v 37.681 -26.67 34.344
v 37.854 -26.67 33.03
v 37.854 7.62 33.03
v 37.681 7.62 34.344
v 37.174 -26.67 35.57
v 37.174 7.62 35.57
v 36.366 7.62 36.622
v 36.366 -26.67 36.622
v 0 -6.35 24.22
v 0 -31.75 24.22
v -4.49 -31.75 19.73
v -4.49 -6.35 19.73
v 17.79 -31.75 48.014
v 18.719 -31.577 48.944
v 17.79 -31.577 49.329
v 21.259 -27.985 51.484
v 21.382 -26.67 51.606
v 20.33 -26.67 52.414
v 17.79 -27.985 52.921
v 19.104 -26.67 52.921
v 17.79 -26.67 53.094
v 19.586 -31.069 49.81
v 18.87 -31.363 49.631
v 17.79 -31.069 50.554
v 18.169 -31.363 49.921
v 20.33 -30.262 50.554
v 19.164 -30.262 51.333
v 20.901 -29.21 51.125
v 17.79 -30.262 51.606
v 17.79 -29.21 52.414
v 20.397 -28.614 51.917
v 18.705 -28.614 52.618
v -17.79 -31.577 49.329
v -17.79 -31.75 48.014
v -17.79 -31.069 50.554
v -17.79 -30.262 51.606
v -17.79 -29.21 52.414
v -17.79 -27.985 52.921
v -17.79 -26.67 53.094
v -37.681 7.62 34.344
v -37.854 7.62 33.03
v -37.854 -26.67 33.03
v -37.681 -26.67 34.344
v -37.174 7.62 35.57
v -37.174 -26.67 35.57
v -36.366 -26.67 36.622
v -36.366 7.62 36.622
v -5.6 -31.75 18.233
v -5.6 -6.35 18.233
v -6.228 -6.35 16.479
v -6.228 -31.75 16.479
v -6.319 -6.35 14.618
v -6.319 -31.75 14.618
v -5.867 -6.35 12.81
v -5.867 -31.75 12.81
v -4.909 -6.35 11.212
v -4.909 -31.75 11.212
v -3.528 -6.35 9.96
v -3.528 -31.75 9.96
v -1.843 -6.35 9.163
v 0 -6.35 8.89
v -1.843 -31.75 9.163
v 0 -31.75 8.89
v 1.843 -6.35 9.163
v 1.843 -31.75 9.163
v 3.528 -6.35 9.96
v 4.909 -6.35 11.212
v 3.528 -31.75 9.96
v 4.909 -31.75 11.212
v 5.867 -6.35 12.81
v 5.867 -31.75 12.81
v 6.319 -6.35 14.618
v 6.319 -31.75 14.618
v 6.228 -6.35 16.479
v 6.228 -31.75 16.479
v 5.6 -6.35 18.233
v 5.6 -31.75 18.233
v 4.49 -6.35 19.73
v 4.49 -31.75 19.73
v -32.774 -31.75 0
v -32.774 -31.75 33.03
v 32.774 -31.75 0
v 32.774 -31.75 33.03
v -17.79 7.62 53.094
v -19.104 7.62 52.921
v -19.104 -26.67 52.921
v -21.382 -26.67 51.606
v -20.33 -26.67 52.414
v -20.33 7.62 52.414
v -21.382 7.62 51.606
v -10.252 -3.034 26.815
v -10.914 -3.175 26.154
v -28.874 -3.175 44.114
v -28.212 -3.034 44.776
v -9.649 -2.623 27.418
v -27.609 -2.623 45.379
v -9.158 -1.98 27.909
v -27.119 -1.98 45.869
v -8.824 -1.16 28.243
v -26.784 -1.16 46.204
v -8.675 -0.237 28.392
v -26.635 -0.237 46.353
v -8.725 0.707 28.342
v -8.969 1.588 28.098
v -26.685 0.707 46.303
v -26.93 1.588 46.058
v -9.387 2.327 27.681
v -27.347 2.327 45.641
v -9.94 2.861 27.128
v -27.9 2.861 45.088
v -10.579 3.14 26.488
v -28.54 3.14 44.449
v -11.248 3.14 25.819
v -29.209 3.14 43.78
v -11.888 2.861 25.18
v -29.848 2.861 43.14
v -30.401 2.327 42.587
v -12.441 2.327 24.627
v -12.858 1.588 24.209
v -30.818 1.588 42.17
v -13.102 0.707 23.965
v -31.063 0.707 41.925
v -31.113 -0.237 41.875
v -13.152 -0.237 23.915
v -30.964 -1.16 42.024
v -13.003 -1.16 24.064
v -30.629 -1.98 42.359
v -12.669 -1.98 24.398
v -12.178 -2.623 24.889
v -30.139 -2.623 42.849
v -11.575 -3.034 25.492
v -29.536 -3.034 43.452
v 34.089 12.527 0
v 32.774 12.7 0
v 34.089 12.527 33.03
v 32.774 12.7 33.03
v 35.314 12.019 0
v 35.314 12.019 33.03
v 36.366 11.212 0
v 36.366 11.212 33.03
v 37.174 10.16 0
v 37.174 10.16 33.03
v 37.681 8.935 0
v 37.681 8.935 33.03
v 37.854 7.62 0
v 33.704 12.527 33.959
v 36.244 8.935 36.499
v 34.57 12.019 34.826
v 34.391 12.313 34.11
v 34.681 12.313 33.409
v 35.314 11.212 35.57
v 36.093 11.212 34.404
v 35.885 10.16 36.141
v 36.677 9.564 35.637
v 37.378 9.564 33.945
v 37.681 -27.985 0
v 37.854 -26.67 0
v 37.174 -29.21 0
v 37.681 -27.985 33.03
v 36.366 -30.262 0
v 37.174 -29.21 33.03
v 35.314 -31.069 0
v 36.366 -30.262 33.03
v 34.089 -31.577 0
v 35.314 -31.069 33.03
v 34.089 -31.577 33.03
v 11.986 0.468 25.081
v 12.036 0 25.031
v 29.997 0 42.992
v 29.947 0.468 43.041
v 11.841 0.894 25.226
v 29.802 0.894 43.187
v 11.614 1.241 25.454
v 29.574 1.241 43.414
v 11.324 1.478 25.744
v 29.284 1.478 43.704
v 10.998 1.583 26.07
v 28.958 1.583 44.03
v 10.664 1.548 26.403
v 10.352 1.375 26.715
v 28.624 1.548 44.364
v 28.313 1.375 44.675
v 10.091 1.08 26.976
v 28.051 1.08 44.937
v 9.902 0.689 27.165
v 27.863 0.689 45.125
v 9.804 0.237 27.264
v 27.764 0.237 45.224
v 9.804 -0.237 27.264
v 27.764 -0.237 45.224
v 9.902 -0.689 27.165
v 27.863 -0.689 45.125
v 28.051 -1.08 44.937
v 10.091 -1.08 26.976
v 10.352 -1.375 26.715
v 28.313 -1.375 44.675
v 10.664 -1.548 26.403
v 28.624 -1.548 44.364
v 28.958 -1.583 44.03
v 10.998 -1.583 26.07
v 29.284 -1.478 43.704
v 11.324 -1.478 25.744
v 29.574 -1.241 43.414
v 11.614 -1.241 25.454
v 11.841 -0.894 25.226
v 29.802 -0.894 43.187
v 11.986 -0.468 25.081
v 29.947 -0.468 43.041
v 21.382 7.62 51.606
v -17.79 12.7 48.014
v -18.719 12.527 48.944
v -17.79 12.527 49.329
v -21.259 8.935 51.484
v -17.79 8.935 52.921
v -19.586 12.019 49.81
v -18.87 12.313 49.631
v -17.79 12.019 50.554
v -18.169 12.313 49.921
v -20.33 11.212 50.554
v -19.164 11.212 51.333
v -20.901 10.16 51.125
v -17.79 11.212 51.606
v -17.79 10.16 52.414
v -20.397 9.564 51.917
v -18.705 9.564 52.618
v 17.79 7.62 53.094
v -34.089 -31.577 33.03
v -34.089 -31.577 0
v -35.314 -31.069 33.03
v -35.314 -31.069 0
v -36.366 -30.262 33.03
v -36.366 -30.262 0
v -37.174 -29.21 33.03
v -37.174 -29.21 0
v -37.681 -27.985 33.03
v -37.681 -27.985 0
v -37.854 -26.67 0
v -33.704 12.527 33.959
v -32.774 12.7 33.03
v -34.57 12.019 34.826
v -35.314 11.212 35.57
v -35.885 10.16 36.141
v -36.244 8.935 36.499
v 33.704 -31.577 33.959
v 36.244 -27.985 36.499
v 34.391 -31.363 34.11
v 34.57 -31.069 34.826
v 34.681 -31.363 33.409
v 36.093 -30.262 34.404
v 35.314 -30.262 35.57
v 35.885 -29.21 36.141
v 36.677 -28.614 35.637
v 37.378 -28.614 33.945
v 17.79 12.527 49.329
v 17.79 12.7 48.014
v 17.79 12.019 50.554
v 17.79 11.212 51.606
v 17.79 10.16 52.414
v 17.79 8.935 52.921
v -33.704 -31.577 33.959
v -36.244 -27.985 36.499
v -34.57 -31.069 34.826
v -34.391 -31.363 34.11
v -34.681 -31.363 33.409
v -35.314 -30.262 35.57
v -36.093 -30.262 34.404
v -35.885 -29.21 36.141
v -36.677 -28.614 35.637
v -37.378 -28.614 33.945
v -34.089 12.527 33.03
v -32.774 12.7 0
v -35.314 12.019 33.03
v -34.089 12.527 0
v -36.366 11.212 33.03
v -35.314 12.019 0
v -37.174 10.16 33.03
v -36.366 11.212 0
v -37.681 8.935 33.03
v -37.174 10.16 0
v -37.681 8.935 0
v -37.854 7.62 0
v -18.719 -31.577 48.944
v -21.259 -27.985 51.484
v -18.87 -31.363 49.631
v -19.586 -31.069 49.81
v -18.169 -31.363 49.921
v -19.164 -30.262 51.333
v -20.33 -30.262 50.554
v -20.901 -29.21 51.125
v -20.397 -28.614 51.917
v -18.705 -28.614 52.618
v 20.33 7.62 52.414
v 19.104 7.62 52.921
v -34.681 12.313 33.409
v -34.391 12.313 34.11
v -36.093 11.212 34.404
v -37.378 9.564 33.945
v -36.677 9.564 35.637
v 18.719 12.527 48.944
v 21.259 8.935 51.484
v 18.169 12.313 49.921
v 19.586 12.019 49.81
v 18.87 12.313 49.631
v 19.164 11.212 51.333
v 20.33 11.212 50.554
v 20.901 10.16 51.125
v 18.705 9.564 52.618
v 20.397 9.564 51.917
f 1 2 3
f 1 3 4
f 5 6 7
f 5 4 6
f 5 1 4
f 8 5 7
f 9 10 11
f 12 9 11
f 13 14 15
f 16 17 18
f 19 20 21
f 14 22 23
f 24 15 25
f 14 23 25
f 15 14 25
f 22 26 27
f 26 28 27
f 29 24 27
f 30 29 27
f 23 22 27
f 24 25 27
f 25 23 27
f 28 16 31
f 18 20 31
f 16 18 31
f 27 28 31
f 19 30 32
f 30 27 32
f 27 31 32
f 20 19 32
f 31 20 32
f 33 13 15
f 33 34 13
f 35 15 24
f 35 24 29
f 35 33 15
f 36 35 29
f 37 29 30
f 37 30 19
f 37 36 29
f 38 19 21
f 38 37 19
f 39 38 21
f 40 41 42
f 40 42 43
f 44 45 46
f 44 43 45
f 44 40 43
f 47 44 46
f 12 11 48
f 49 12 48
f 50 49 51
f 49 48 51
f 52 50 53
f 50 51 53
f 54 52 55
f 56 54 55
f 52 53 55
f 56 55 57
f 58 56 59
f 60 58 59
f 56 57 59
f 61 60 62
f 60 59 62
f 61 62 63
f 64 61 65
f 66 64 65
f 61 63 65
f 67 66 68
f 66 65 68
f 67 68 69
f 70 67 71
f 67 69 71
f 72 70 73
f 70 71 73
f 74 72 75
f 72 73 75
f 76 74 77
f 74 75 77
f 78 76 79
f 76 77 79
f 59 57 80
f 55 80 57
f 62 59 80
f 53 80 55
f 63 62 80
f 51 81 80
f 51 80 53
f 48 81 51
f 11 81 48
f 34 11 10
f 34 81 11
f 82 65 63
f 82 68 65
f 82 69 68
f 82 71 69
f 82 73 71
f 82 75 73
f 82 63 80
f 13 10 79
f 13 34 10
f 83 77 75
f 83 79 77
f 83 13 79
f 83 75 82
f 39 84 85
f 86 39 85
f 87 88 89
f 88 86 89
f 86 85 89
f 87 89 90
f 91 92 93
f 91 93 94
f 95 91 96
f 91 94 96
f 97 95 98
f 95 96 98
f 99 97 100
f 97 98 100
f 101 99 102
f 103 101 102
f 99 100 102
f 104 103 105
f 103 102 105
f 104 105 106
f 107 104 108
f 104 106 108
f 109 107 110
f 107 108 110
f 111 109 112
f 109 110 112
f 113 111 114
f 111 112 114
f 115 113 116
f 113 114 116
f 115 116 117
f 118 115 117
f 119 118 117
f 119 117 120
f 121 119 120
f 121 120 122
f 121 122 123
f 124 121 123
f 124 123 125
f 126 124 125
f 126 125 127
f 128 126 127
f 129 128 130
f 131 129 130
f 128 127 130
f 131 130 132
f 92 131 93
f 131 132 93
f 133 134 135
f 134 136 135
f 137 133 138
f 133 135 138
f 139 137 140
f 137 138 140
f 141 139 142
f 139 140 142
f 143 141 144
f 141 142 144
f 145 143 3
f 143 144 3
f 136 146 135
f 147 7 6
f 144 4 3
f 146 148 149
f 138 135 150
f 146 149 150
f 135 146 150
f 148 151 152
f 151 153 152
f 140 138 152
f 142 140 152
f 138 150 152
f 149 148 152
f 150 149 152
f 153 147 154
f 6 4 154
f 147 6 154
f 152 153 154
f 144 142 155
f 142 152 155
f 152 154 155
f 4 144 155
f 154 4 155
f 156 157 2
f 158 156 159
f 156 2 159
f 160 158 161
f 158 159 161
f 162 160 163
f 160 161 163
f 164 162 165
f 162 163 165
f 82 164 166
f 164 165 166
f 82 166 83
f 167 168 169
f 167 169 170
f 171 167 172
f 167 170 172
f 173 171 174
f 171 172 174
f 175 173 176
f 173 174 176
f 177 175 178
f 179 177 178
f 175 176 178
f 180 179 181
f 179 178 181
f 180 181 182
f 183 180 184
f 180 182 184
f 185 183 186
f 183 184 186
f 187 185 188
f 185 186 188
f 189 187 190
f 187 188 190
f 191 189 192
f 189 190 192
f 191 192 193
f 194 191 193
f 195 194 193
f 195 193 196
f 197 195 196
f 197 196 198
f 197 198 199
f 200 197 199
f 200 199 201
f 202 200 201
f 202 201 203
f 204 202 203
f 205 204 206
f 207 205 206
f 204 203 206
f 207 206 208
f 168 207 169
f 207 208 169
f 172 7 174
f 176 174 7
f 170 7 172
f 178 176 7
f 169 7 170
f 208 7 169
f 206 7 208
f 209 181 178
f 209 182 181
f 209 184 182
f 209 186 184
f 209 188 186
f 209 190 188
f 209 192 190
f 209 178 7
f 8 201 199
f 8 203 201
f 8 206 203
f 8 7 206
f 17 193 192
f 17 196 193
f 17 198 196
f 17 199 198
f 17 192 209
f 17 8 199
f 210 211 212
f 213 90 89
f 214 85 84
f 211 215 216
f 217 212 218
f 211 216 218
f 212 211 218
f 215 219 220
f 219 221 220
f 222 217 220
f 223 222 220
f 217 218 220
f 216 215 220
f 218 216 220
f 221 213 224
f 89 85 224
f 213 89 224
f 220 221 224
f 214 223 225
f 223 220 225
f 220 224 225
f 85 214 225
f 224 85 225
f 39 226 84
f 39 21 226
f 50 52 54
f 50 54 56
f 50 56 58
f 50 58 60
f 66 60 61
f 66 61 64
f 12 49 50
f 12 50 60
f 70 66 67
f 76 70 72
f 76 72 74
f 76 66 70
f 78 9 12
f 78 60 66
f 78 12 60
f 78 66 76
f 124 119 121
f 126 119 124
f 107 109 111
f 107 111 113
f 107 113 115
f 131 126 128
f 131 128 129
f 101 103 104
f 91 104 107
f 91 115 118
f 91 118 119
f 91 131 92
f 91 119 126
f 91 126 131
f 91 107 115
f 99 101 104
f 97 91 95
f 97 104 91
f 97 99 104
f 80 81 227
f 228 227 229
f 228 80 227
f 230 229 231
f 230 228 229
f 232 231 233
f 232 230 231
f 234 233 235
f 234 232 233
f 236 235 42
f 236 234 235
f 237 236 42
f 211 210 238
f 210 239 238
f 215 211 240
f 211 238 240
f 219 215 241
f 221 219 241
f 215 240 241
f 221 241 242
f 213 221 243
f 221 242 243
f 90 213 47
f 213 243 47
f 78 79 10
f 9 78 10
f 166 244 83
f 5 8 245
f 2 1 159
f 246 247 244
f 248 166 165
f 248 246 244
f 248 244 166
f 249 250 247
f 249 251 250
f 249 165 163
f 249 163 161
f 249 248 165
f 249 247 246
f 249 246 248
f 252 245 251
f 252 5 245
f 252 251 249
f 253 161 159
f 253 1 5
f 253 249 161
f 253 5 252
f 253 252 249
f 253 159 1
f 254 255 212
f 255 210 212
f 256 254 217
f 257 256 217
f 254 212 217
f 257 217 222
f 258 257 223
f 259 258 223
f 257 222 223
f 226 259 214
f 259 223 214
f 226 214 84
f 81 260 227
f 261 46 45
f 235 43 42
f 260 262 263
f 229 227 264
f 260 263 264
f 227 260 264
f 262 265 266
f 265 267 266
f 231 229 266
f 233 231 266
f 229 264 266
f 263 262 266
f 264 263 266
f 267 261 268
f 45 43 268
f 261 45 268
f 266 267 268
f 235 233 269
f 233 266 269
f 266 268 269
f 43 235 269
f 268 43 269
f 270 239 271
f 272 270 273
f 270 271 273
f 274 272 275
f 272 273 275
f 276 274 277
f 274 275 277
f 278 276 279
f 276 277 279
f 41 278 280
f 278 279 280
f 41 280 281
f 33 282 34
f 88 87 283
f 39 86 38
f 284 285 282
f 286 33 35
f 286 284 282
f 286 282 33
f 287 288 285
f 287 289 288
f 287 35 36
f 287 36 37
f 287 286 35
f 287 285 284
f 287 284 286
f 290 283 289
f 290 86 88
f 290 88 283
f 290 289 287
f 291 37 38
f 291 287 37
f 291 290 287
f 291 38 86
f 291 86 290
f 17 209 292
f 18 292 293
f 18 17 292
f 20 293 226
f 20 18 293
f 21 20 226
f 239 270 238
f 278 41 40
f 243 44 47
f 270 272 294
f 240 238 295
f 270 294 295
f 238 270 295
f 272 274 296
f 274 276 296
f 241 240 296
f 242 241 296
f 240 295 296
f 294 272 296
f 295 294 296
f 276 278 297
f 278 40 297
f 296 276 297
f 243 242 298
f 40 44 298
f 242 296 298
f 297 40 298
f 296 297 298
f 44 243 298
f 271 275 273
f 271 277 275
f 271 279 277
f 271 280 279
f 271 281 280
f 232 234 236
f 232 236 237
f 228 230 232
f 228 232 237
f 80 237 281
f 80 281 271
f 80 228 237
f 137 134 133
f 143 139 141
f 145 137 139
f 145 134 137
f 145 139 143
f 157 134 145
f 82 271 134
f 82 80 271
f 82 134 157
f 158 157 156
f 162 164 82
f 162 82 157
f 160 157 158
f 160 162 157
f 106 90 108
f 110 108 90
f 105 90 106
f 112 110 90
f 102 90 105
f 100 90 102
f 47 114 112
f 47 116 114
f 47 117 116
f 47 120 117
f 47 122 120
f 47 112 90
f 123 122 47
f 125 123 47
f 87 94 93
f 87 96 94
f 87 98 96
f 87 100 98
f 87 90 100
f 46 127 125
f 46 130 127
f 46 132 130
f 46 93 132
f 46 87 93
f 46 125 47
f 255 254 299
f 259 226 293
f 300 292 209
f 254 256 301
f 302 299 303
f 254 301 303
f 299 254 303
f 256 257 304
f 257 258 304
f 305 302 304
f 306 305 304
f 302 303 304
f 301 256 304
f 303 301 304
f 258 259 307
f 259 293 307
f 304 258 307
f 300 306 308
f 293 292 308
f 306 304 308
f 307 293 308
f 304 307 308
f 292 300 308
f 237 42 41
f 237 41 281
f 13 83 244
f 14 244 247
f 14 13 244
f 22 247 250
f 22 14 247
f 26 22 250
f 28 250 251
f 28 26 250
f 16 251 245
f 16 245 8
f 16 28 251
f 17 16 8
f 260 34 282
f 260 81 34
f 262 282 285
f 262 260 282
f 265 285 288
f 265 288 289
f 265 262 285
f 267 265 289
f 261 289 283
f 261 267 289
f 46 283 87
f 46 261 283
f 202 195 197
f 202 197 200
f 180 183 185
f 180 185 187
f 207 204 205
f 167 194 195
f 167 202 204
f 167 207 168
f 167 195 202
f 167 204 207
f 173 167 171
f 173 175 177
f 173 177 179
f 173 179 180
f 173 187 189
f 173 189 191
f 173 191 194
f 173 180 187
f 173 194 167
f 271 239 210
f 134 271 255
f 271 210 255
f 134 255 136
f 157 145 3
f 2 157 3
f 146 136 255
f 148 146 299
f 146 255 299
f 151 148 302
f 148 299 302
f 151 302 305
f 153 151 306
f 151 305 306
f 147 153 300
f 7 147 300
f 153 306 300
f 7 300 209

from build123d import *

# Parameters (mm, degrees)
F1_DEPTH      = 31.75
F1_DEPTH_BACK = 12.7
F2_R          = 3.175
F3_DEPTH      = 25.4
F4_R          = 1.5875
F5_DEPTH      = 25.4
F7_DEPTH      = 25.4
F8_R          = 5.08


with BuildPart() as f1:
    # F0 (on Front) → F1 (new body, two sides)
    with BuildSketch(Plane.XZ) as f1_sk:
        Polygon((-37.854384, 0), (0, 0), (37.854384, 0), (37.854384, 35.133872), (19.893872, 53.094384), (0, 53.094384), (-19.893872, 53.094384), (-37.854384, 35.133872), align=None)
    extrude(amount=F1_DEPTH)
    extrude(f1_sk.sketch, amount=-F1_DEPTH_BACK)

    # F2 (on face) → F3 (cut)
    with BuildSketch(Plane(origin=(-36.494128, 0, 36.494128), x_dir=(0, -1, 0), z_dir=(-0.707107, 0, 0.707107))):
        with Locations((0, 10.776307)):
            Circle(F2_R)
    extrude(amount=-F3_DEPTH, mode=Mode.SUBTRACT)

    # F4 (on face) → F5 (cut)
    with BuildSketch(Plane(origin=(36.494128, 0, 36.494128), x_dir=(0.707107, 0, -0.707107), z_dir=(0.707107, 0, 0.707107))):
        with Locations((-10.776307, 0)):
            Circle(F4_R)
    extrude(amount=-F5_DEPTH, mode=Mode.SUBTRACT)

    # F6 (on face) → F7 (cut)
    with BuildSketch(Plane.XZ.offset(31.75)):
        with BuildLine():
            Line((0, 24.220256), (-4.490128, 19.730128))
            ThreePointArc((-4.490128, 19.730128), (0, 8.89), (4.490128, 19.730128))
            Line((4.490128, 19.730128), (0, 24.220256))
        make_face()
    extrude(amount=-F7_DEPTH, mode=Mode.SUBTRACT)

    # F8
    f8_edges = [f1.edges().sort_by_distance(p)[0] for p in [
        (-37.854384, 12.7, 17.566936),
        (-28.874128, 12.7, 44.114128),
        (0, 12.7, 53.094384),
        (28.874128, 12.7, 44.114128),
        (37.854384, 12.7, 17.566936),
        (-19.893872, -9.525, 53.094384),
        (-37.854384, -9.525, 35.133872),
        (-28.874128, -31.75, 44.114128),
        (-37.854384, -31.75, 17.566936),
        (0, -31.75, 53.094384),
        (19.893872, -9.525, 53.094384),
        (28.874128, -31.75, 44.114128),
        (37.854384, -31.75, 17.566936),
        (37.854384, -9.525, 35.133872),
    ]]
    fillet(f8_edges, radius=F8_R)


solid = f1.part
